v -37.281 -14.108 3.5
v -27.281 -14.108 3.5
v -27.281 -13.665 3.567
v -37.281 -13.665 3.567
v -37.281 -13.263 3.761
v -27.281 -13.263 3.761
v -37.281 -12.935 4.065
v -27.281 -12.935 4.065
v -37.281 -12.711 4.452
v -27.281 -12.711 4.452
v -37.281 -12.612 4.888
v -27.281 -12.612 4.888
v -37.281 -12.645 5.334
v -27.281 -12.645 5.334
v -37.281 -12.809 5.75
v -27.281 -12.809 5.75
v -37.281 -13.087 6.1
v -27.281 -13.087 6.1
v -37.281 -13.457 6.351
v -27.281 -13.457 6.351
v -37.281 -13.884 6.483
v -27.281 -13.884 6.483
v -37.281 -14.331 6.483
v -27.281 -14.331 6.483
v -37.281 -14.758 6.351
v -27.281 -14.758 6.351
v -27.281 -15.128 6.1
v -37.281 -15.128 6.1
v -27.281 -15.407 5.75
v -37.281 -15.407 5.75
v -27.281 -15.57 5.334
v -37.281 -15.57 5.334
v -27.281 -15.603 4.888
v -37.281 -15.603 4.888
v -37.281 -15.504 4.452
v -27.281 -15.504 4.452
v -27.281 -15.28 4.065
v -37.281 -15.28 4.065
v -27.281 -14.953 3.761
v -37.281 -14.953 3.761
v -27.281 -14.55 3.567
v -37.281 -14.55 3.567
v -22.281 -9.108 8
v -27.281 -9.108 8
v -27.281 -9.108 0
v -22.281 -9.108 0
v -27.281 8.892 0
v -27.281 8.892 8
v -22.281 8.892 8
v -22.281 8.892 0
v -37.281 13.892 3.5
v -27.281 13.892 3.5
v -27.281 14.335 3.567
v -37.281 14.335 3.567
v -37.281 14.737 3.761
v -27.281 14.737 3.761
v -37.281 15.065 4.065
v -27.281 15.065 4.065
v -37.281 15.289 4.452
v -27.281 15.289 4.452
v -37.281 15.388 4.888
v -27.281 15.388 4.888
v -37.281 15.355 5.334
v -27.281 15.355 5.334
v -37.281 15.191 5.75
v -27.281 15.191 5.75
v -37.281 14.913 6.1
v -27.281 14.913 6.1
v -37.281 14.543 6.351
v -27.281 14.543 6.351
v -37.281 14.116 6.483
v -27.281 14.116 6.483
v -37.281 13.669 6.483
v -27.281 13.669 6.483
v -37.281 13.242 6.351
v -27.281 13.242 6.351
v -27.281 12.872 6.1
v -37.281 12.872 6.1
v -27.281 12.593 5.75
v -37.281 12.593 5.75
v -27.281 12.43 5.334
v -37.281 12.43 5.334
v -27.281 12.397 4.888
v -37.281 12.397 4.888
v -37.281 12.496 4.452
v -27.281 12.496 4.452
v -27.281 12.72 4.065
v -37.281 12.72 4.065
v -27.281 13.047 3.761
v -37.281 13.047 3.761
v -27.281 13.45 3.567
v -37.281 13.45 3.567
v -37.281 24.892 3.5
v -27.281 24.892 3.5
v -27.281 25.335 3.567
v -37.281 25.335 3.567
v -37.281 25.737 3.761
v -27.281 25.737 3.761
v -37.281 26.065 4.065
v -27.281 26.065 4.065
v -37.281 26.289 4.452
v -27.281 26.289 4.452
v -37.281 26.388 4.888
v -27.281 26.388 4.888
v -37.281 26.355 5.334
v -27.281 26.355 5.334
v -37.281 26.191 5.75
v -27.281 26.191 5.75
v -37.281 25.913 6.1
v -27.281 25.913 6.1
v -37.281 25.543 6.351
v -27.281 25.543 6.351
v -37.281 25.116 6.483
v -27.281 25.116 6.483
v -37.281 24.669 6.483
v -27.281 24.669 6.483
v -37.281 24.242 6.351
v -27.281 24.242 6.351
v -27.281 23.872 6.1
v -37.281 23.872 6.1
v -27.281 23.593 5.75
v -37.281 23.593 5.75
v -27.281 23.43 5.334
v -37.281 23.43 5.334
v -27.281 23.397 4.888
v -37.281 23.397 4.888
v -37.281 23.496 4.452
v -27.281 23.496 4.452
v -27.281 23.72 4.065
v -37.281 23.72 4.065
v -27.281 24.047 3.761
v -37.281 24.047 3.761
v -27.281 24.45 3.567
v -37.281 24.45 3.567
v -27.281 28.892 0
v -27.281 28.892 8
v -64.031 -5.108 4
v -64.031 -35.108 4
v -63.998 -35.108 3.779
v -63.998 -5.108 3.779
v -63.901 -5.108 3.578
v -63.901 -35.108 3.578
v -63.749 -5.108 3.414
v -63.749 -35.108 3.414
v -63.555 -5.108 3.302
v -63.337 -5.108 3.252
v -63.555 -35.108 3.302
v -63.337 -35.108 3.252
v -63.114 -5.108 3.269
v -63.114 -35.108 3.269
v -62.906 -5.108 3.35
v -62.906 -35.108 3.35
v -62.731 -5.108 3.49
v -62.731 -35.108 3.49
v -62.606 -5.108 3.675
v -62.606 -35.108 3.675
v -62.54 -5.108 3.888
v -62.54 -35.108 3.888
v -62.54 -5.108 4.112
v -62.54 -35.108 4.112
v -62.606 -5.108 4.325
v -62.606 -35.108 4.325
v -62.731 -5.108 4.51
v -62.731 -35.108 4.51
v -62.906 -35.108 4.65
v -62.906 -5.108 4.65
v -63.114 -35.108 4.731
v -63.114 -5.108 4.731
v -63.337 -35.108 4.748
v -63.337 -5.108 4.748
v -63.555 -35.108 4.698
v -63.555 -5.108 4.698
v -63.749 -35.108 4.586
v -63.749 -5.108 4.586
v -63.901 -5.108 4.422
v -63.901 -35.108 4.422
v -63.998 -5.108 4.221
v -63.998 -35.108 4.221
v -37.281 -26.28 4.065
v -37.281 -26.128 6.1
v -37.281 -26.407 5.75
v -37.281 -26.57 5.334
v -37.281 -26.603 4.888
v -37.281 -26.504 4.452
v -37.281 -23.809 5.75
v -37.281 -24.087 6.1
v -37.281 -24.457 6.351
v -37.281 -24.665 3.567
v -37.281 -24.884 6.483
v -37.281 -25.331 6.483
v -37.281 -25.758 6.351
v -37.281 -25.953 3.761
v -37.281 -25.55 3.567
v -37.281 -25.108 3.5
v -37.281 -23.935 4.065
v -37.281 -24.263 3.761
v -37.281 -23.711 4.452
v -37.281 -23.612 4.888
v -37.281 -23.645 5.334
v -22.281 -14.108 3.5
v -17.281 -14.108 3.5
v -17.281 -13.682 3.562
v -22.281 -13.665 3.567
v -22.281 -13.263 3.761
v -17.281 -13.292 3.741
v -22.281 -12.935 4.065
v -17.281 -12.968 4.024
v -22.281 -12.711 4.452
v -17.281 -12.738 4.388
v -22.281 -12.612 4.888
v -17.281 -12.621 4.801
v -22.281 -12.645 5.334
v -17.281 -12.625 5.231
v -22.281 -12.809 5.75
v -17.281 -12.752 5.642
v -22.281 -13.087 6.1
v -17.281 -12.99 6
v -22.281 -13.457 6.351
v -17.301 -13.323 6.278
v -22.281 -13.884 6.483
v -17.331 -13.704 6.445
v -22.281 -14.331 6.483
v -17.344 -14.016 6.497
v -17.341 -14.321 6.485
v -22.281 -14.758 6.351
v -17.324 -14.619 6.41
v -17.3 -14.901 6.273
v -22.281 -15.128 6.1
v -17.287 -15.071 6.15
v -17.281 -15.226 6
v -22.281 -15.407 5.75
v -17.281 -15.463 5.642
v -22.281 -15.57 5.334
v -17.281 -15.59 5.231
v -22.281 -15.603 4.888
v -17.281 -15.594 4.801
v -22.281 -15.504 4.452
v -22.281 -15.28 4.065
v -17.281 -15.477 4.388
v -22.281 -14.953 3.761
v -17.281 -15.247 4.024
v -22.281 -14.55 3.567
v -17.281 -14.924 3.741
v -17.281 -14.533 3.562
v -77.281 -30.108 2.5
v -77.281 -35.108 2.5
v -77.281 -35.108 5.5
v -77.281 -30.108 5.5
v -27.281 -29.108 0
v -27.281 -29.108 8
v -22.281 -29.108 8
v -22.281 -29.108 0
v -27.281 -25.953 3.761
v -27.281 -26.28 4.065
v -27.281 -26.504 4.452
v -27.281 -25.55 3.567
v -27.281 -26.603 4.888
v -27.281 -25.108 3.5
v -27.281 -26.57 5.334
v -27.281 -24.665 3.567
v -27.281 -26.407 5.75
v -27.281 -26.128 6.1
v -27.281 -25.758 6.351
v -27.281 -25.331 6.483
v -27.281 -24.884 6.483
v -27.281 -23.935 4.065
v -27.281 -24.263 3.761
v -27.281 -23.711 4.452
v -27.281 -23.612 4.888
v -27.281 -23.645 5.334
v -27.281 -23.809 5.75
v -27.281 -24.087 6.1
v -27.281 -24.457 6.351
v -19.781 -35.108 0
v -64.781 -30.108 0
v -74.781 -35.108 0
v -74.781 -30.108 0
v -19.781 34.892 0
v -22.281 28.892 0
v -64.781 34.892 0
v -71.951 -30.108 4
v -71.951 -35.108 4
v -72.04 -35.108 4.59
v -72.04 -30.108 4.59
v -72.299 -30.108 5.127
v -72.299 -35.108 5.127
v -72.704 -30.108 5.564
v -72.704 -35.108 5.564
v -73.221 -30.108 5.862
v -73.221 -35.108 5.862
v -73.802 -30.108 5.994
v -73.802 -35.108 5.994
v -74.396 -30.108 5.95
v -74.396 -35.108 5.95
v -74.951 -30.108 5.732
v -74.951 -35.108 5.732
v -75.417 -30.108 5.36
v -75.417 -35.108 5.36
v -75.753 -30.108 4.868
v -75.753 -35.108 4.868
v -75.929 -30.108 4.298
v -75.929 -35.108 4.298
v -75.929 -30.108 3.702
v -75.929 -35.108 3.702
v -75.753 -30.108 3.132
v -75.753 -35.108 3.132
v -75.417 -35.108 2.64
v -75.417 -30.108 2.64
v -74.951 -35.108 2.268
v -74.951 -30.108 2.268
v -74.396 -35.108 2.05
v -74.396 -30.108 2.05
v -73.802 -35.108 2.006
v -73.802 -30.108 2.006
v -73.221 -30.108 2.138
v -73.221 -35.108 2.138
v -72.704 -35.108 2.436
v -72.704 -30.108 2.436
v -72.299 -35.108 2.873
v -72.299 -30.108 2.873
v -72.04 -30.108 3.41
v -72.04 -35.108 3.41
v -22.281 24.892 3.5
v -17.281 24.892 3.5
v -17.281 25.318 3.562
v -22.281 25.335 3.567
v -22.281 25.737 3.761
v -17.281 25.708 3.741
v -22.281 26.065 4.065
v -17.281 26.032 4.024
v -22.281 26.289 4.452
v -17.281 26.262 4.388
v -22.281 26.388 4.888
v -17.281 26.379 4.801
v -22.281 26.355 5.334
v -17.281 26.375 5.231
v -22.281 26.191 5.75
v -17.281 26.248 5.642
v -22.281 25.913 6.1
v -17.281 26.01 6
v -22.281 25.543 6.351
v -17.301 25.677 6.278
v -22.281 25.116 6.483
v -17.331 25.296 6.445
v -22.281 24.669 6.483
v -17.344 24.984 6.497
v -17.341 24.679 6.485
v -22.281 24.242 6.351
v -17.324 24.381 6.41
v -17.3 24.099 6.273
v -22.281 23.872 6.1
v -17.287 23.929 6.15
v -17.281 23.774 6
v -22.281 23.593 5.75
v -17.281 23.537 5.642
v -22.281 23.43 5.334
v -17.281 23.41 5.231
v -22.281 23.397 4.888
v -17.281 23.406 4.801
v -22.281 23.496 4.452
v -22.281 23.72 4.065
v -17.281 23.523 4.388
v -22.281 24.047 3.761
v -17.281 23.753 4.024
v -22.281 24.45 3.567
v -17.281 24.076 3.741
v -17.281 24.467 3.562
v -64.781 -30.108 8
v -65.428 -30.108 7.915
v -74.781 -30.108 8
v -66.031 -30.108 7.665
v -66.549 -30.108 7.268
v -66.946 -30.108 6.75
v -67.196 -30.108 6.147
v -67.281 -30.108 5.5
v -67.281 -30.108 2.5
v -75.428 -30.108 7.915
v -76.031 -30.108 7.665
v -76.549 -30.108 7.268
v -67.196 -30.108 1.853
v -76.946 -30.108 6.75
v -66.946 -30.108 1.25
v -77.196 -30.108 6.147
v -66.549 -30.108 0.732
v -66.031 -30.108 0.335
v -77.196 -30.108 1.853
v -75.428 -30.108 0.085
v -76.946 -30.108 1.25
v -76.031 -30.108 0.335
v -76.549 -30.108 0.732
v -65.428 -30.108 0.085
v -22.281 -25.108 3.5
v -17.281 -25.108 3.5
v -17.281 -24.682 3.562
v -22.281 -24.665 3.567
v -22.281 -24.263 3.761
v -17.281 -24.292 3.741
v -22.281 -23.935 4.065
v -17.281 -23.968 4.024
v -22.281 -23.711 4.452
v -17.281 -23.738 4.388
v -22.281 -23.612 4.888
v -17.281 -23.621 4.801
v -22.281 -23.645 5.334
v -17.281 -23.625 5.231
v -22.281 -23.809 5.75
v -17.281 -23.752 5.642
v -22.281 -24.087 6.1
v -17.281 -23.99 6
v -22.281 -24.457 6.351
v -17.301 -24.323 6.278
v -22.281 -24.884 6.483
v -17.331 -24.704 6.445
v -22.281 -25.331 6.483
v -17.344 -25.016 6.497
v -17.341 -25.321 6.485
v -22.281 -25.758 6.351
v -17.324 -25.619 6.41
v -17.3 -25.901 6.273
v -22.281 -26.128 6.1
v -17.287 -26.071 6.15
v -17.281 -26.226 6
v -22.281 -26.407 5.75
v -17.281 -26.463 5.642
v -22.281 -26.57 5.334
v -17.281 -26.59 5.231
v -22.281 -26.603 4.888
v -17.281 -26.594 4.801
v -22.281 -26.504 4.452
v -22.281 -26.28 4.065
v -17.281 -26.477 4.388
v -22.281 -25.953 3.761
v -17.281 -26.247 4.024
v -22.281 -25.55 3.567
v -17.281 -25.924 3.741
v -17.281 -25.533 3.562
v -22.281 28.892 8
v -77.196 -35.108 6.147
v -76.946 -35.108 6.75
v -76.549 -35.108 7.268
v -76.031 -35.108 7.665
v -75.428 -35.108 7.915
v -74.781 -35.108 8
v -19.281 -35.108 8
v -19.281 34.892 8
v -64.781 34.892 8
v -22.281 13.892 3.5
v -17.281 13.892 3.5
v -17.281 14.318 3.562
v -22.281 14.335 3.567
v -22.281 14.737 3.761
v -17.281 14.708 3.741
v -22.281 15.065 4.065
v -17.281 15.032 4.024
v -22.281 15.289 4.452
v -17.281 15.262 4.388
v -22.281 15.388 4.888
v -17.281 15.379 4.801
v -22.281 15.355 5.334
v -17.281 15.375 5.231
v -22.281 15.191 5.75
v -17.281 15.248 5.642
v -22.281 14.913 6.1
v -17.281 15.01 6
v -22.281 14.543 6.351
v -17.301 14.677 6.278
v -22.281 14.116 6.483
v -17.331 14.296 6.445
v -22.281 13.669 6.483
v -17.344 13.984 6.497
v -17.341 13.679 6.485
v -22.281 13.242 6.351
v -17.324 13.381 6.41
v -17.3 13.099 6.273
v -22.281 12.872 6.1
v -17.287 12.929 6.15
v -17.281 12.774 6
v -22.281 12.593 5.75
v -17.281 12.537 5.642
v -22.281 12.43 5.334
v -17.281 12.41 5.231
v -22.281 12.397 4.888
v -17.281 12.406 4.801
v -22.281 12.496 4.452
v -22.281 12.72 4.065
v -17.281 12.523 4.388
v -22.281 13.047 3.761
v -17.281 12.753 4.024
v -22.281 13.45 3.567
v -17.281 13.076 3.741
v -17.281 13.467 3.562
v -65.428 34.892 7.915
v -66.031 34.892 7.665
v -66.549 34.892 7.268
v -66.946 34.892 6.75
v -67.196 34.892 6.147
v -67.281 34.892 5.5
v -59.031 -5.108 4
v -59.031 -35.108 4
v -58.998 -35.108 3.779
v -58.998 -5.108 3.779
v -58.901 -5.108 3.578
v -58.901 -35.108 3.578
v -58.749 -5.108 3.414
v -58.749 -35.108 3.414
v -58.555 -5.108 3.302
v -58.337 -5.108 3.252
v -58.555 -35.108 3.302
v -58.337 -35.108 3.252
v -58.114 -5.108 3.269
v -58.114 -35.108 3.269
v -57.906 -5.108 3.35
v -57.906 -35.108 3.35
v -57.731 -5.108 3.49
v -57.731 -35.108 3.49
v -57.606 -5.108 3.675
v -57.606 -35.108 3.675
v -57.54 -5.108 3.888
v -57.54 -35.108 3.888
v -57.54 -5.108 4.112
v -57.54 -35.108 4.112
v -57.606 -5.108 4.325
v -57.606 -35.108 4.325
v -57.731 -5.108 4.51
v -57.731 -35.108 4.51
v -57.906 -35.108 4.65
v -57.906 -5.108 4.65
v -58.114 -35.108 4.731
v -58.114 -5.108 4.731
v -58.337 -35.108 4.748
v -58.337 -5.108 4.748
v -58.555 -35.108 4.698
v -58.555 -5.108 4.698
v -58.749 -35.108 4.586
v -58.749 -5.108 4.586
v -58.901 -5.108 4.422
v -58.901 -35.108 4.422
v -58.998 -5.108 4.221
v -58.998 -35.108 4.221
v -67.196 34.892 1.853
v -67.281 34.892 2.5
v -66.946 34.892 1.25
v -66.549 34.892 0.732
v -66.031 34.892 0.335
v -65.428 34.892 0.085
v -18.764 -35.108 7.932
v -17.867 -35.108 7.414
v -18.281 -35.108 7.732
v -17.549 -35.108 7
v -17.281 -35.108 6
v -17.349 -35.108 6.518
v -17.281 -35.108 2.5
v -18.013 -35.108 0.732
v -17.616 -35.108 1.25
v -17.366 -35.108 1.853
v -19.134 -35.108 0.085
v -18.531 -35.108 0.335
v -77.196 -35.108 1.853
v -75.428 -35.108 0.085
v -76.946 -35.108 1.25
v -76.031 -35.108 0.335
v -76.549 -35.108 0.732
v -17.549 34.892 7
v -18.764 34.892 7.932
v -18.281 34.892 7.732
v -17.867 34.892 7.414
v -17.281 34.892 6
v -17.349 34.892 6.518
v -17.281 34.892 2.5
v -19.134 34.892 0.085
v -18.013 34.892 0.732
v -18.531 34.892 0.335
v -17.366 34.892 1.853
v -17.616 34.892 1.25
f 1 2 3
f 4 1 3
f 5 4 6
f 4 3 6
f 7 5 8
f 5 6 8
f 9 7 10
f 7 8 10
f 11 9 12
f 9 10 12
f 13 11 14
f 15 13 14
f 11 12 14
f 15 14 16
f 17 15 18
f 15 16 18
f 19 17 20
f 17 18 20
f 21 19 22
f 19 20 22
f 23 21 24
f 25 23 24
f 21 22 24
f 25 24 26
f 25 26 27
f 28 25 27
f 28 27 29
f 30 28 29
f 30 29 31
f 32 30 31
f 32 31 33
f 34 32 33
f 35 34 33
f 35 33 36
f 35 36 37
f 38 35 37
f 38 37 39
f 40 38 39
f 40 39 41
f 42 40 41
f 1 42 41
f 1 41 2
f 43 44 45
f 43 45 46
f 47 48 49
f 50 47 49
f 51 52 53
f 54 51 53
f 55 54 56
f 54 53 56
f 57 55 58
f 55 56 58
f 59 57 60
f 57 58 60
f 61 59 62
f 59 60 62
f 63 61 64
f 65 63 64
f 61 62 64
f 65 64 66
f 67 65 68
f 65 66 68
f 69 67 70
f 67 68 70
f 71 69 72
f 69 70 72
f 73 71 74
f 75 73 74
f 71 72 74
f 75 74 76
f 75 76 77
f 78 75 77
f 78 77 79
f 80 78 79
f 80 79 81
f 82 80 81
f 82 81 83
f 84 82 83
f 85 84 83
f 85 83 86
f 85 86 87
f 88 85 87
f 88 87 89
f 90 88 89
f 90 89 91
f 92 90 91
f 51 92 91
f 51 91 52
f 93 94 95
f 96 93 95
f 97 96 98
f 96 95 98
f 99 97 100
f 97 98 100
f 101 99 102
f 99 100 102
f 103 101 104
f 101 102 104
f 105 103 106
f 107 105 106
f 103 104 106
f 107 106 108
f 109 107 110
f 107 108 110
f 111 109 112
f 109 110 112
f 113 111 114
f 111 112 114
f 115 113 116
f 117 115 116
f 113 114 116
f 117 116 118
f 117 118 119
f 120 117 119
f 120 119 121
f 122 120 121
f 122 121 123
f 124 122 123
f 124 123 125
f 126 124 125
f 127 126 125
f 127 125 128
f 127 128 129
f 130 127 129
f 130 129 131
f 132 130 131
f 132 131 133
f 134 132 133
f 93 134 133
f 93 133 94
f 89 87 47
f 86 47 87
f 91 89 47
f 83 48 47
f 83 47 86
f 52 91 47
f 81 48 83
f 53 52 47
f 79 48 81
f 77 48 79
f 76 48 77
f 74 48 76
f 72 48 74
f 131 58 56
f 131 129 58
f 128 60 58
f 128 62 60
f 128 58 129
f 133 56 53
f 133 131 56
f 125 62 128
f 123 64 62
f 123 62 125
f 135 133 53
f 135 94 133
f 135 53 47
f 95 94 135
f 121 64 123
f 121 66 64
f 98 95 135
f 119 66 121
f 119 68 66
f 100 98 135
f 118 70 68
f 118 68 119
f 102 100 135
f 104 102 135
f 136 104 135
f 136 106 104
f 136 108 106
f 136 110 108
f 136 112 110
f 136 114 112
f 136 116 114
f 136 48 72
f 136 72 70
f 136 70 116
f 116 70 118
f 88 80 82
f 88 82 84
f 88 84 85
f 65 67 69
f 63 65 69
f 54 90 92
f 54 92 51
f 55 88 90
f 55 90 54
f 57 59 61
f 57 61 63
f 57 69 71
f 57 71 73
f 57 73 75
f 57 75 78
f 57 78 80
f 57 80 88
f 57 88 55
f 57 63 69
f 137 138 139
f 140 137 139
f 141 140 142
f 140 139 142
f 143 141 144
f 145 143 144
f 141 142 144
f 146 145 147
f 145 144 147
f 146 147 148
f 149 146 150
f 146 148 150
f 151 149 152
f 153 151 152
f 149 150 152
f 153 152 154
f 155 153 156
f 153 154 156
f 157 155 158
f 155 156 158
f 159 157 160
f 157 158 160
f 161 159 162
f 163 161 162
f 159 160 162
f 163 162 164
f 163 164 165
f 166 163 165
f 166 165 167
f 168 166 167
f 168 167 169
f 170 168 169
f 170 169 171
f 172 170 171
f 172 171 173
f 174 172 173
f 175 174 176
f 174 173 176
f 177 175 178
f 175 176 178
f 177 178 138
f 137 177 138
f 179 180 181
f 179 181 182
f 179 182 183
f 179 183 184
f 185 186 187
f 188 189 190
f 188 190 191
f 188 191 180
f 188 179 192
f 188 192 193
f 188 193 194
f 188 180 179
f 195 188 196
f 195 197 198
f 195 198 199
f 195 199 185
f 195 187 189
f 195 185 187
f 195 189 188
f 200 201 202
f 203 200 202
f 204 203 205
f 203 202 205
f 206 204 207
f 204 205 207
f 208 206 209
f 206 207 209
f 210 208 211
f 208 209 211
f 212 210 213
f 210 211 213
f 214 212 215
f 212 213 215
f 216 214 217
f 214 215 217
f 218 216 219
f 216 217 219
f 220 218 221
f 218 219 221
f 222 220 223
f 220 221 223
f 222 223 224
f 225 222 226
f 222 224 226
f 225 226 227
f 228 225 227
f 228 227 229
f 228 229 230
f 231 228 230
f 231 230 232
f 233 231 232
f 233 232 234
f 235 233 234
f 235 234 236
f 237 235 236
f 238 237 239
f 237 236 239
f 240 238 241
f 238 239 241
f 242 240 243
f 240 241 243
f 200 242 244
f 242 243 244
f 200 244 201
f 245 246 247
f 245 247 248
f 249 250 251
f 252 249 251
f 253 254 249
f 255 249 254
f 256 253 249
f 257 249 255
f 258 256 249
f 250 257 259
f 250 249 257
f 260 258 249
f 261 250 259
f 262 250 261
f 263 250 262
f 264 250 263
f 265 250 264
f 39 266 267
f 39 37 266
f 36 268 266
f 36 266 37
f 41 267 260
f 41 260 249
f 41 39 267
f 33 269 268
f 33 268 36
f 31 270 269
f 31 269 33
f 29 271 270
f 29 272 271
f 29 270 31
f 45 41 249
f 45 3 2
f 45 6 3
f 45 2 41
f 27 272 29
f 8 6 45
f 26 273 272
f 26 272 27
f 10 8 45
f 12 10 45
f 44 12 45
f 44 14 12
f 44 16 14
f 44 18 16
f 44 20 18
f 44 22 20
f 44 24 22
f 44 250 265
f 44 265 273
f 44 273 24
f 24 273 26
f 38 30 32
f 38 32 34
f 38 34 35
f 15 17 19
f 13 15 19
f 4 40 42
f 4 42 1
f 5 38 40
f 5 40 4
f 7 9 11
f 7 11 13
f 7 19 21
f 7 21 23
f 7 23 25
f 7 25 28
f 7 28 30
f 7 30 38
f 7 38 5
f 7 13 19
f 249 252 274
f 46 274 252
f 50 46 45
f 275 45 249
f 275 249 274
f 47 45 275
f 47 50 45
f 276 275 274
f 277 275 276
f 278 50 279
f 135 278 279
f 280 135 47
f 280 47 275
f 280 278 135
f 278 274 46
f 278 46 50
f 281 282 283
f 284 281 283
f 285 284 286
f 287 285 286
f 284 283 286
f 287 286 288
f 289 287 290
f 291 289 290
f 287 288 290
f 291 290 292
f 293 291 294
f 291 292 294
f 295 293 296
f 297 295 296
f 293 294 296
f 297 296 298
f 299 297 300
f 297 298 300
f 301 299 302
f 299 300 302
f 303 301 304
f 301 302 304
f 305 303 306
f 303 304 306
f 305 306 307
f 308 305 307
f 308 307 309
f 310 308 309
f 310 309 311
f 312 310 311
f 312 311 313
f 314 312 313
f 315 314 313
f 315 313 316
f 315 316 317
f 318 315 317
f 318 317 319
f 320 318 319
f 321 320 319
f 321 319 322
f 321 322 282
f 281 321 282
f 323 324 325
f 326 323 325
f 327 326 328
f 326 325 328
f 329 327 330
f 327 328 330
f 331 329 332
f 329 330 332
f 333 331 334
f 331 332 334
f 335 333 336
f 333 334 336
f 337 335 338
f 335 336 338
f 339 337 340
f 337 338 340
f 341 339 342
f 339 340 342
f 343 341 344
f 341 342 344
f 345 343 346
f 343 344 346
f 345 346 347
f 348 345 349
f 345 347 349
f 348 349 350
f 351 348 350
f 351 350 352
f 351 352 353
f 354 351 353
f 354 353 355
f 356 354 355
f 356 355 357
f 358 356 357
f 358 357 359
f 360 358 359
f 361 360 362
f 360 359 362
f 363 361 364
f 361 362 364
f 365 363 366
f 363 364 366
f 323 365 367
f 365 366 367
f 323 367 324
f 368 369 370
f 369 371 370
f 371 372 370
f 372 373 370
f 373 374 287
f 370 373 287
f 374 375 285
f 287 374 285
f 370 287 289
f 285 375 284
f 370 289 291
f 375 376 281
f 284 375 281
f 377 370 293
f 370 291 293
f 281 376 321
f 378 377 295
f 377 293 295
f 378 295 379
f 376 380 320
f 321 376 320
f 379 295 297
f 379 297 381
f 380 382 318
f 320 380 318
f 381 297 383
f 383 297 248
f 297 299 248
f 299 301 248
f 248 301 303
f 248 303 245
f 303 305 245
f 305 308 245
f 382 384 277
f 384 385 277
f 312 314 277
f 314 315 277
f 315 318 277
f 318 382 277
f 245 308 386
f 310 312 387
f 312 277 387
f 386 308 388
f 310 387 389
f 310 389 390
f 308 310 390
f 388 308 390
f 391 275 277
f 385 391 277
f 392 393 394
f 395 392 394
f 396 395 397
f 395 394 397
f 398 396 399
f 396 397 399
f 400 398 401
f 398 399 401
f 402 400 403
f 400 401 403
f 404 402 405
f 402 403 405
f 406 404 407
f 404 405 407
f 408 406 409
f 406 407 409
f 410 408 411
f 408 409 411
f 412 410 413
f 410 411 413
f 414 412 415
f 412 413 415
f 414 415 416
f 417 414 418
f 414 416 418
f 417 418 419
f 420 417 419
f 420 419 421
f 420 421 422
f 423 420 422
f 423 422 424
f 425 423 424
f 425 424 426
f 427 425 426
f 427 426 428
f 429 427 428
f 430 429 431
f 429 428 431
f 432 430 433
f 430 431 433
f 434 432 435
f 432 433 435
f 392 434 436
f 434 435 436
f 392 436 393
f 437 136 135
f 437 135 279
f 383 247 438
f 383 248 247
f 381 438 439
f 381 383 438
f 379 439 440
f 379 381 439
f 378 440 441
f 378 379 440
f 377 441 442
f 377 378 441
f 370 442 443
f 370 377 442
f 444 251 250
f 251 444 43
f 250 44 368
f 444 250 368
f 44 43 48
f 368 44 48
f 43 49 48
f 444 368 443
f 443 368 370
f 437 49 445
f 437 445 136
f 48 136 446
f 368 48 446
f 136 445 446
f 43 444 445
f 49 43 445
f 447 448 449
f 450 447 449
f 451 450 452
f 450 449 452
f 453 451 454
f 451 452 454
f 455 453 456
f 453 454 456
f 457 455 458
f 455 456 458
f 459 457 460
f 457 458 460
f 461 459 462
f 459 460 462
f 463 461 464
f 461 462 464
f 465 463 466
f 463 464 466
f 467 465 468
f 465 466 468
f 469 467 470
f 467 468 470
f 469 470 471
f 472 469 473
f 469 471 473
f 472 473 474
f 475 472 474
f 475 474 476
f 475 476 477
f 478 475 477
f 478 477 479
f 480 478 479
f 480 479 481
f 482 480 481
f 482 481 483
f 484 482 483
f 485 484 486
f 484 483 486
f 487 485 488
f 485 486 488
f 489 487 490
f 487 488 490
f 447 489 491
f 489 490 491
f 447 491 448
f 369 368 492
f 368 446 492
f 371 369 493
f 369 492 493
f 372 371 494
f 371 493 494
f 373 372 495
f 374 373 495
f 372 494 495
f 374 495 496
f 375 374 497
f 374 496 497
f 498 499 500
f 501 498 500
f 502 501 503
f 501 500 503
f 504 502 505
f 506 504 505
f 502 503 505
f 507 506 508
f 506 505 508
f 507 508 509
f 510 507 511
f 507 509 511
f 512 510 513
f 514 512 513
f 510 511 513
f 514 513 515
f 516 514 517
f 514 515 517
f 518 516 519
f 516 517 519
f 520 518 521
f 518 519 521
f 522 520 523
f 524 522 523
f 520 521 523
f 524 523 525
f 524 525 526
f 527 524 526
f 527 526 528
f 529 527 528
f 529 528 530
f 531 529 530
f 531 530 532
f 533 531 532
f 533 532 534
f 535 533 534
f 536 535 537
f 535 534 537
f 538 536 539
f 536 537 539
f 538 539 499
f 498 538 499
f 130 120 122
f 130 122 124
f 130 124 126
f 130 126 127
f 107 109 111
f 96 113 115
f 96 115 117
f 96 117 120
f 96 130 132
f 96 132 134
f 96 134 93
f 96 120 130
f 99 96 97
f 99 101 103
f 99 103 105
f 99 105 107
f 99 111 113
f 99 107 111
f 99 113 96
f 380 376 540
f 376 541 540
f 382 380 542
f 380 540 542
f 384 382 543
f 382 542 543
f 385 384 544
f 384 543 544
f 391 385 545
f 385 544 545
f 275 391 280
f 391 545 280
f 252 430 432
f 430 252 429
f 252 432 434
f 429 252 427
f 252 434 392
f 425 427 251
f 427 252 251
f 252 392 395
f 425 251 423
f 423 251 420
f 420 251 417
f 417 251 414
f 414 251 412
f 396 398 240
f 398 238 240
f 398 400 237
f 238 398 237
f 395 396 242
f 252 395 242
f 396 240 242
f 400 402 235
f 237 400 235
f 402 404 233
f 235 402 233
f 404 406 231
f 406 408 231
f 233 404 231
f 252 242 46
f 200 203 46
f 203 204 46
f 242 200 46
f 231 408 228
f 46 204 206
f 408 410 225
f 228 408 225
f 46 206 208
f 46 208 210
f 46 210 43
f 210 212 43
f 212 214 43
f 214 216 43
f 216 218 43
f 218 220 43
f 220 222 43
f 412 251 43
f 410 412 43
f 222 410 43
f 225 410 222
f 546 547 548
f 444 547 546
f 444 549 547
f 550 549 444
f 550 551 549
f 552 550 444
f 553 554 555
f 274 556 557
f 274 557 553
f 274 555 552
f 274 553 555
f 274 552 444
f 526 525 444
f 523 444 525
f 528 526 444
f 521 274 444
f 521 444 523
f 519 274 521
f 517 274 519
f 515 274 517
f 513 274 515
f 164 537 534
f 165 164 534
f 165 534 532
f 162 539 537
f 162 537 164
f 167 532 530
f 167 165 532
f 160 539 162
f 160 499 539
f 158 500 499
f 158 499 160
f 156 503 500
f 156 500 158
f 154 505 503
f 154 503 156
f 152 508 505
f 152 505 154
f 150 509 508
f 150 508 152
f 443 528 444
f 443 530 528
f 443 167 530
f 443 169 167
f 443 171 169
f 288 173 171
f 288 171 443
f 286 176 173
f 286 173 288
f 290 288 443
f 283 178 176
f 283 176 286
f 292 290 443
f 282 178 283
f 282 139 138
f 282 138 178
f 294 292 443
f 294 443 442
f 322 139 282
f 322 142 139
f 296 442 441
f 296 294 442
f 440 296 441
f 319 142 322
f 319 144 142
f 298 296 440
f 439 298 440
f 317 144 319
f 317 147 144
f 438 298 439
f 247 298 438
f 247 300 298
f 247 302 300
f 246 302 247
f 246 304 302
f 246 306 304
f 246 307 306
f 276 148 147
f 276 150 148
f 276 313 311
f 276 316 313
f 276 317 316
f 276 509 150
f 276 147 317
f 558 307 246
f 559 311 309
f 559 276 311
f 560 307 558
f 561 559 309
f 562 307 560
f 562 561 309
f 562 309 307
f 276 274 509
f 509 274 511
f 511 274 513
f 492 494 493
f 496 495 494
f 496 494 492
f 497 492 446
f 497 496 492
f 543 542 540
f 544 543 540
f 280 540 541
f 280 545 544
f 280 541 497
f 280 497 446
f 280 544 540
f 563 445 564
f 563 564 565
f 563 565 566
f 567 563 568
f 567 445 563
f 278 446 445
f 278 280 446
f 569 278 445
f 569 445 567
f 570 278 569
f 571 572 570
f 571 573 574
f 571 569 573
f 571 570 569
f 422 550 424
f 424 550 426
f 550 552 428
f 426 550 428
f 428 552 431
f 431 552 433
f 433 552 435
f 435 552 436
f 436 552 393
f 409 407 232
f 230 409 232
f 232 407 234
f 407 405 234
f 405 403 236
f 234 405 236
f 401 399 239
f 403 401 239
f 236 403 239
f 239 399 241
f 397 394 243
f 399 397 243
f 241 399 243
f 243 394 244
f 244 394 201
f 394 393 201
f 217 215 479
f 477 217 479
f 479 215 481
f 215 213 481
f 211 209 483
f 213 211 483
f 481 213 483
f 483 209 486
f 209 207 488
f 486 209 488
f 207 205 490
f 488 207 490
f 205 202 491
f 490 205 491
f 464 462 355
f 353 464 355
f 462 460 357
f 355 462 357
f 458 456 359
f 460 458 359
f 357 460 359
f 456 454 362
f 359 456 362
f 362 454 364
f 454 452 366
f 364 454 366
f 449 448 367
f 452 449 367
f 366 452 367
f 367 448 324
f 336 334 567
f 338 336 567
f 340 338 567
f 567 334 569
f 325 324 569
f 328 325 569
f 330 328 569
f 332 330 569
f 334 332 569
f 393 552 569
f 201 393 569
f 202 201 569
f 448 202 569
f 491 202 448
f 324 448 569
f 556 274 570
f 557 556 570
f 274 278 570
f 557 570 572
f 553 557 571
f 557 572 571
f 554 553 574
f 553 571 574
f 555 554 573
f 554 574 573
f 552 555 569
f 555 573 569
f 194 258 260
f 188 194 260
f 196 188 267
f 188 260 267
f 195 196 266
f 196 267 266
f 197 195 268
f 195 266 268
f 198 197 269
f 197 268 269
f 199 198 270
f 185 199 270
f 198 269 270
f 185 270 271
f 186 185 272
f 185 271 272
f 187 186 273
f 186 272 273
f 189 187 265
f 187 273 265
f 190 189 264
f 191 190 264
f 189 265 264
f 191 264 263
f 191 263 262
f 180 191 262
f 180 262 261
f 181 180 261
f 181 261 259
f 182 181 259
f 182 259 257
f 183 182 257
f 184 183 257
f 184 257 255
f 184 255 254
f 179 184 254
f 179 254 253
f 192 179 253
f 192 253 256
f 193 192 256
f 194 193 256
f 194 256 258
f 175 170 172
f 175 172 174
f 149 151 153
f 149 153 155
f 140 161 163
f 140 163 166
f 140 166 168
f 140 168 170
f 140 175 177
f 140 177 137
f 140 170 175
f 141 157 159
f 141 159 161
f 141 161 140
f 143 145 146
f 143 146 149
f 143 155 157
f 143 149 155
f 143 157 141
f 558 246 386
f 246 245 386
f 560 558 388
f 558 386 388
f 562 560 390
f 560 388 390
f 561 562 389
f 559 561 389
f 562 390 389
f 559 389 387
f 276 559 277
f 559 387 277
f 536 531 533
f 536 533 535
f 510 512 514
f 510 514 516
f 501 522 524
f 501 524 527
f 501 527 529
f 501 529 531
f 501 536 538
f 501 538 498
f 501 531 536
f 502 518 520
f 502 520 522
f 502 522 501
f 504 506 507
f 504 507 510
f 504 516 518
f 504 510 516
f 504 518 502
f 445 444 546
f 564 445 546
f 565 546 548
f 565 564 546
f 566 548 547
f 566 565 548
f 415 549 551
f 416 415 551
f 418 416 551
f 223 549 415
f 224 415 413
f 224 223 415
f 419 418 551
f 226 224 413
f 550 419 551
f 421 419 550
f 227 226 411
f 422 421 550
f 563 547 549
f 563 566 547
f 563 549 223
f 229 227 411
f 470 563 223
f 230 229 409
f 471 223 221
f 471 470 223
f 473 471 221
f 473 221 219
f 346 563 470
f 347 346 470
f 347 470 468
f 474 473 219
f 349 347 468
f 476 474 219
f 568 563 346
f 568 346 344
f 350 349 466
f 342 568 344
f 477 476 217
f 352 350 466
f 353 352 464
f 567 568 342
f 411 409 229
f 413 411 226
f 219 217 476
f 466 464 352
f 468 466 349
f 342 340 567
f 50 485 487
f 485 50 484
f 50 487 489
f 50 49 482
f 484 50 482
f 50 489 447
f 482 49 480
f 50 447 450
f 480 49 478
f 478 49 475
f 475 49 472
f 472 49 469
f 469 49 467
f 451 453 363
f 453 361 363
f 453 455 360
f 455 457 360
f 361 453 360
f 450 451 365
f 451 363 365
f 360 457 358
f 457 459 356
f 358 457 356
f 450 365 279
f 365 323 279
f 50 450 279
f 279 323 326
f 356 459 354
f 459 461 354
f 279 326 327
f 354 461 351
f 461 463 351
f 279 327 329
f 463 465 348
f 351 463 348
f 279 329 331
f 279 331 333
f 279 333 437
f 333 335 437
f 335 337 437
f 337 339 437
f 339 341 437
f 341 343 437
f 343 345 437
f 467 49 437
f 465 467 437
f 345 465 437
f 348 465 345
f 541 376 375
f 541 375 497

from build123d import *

# Parameters (mm, degrees)
ESBO_O2_W                = 50
ESBO_O2_H                = 70
RESSALTO_EXTRUS_O1_DEPTH = 8
ESBO_O3_R                = 0.75
CORTE_EXTRUS_O1_DEPTH    = 30
FILETE1_R                = 2
ESBO_O17_W               = 10
ESBO_O17_H               = 5
RESSALTO_EXTRUS_O4_DEPTH = 8
ESBO_O20_R               = 2
CORTE_EXTRUS_O9_DEPTH    = 8
FILETE2_R                = 2.5
FILETE3_R                = 2.5
FILETE4_R                = 2.5
FILETE5_R                = 2.5
ESBO_O21_W               = 5
ESBO_O21_H               = 20
CORTE_EXTRUS_O10_DEPTH   = 9
FILETE6_R                = 2.5
ESBO_O22_R               = 1.5
CORTE_EXTRUS_O11_DEPTH   = 20


with BuildPart() as part:
    # Esboço2 → Ressalto-extrusão1 (new body)
    with BuildSketch(Plane.XY):
        with Locations((-42.281248797, -0.107598663)):
            Rectangle(ESBO_O2_W, ESBO_O2_H)
    extrude(amount=RESSALTO_EXTRUS_O1_DEPTH)

    # Esboço3 → Corte-extrusão1 (cut)
    with BuildSketch(Plane(origin=(0, -35.107598663, 0), x_dir=(-1, 0, 0), z_dir=(0, -1, 0))):
        with Locations((58.281248797, -4)):
            Circle(ESBO_O3_R)
        with Locations((63.281248797, -4)):
            Circle(ESBO_O3_R)
    extrude(amount=-CORTE_EXTRUS_O1_DEPTH, mode=Mode.SUBTRACT)

    # Filete1
    filete1_edges = [part.edges().sort_by_distance(p)[0] for p in [
        (-17.281248797, -0.107598663, 8),
    ]]
    fillet(filete1_edges, radius=FILETE1_R)

    # Esboço17 → Ressalto-extrusão4 (add)
    with BuildSketch(Plane(origin=(0, 0, 0), x_dir=(-1, 0, 0), z_dir=(0, 0, -1))):
        with Locations((72.281248797, -32.607598663)):
            Rectangle(ESBO_O17_W, ESBO_O17_H)
    extrude(amount=-RESSALTO_EXTRUS_O4_DEPTH)

    # Esboço20 → Corte-extrusão9 (cut)
    with BuildSketch(Plane.XZ.offset(35.107598663)):
        with Locations((-73.951248797, 4)):
            Circle(ESBO_O20_R)
    extrude(amount=-CORTE_EXTRUS_O9_DEPTH, mode=Mode.SUBTRACT)

    # Filete2
    filete2_edges = [part.edges().sort_by_distance(p)[0] for p in [
        (-67.281248797, 2.392401337, 8),
    ]]
    fillet(filete2_edges, radius=FILETE2_R)

    # Filete3
    filete3_edges = [part.edges().sort_by_distance(p)[0] for p in [
        (-67.281248797, 2.392401337, 0),
    ]]
    fillet(filete3_edges, radius=FILETE3_R)

    # Filete4
    filete4_edges = [part.edges().sort_by_distance(p)[0] for p in [
        (-77.281248797, -32.607598663, 8),
    ]]
    fillet(filete4_edges, radius=FILETE4_R)

    # Filete5
    filete5_edges = [part.edges().sort_by_distance(p)[0] for p in [
        (-77.281248797, -32.607598663, 0),
    ]]
    fillet(filete5_edges, radius=FILETE5_R)

    # Esboço21 → Corte-extrusão10 (cut, through all)
    with BuildSketch(Plane.XY.offset(8)):
        with Locations((-24.781248797, 18.892401337)):
            Rectangle(ESBO_O21_W, ESBO_O21_H)
        with Locations((-24.781248797, -19.107598663)):
            Rectangle(ESBO_O21_W, ESBO_O21_H)
    extrude(amount=-CORTE_EXTRUS_O10_DEPTH, mode=Mode.SUBTRACT)

    # Filete6
    filete6_edges = [part.edges().sort_by_distance(p)[0] for p in [
        (-17.281248797, -0.107598663, 0),
    ]]
    fillet(filete6_edges, radius=FILETE6_R)

    # Esboço22 → Corte-extrusão11 (cut)
    with BuildSketch(Plane(origin=(-17.281248797, 0, 0), x_dir=(0, 0, -1), z_dir=(1, 0, 0))):
        with Locations((-5, -25.107598663)):
            Circle(ESBO_O22_R)
        with Locations((-5, -14.107598663)):
            Circle(ESBO_O22_R)
        with Locations((-5, 24.892401337)):
            Circle(ESBO_O22_R)
        with Locations((-5, 13.892401337)):
            Circle(ESBO_O22_R)
    extrude(amount=-CORTE_EXTRUS_O11_DEPTH, mode=Mode.SUBTRACT)


solid = part.part
